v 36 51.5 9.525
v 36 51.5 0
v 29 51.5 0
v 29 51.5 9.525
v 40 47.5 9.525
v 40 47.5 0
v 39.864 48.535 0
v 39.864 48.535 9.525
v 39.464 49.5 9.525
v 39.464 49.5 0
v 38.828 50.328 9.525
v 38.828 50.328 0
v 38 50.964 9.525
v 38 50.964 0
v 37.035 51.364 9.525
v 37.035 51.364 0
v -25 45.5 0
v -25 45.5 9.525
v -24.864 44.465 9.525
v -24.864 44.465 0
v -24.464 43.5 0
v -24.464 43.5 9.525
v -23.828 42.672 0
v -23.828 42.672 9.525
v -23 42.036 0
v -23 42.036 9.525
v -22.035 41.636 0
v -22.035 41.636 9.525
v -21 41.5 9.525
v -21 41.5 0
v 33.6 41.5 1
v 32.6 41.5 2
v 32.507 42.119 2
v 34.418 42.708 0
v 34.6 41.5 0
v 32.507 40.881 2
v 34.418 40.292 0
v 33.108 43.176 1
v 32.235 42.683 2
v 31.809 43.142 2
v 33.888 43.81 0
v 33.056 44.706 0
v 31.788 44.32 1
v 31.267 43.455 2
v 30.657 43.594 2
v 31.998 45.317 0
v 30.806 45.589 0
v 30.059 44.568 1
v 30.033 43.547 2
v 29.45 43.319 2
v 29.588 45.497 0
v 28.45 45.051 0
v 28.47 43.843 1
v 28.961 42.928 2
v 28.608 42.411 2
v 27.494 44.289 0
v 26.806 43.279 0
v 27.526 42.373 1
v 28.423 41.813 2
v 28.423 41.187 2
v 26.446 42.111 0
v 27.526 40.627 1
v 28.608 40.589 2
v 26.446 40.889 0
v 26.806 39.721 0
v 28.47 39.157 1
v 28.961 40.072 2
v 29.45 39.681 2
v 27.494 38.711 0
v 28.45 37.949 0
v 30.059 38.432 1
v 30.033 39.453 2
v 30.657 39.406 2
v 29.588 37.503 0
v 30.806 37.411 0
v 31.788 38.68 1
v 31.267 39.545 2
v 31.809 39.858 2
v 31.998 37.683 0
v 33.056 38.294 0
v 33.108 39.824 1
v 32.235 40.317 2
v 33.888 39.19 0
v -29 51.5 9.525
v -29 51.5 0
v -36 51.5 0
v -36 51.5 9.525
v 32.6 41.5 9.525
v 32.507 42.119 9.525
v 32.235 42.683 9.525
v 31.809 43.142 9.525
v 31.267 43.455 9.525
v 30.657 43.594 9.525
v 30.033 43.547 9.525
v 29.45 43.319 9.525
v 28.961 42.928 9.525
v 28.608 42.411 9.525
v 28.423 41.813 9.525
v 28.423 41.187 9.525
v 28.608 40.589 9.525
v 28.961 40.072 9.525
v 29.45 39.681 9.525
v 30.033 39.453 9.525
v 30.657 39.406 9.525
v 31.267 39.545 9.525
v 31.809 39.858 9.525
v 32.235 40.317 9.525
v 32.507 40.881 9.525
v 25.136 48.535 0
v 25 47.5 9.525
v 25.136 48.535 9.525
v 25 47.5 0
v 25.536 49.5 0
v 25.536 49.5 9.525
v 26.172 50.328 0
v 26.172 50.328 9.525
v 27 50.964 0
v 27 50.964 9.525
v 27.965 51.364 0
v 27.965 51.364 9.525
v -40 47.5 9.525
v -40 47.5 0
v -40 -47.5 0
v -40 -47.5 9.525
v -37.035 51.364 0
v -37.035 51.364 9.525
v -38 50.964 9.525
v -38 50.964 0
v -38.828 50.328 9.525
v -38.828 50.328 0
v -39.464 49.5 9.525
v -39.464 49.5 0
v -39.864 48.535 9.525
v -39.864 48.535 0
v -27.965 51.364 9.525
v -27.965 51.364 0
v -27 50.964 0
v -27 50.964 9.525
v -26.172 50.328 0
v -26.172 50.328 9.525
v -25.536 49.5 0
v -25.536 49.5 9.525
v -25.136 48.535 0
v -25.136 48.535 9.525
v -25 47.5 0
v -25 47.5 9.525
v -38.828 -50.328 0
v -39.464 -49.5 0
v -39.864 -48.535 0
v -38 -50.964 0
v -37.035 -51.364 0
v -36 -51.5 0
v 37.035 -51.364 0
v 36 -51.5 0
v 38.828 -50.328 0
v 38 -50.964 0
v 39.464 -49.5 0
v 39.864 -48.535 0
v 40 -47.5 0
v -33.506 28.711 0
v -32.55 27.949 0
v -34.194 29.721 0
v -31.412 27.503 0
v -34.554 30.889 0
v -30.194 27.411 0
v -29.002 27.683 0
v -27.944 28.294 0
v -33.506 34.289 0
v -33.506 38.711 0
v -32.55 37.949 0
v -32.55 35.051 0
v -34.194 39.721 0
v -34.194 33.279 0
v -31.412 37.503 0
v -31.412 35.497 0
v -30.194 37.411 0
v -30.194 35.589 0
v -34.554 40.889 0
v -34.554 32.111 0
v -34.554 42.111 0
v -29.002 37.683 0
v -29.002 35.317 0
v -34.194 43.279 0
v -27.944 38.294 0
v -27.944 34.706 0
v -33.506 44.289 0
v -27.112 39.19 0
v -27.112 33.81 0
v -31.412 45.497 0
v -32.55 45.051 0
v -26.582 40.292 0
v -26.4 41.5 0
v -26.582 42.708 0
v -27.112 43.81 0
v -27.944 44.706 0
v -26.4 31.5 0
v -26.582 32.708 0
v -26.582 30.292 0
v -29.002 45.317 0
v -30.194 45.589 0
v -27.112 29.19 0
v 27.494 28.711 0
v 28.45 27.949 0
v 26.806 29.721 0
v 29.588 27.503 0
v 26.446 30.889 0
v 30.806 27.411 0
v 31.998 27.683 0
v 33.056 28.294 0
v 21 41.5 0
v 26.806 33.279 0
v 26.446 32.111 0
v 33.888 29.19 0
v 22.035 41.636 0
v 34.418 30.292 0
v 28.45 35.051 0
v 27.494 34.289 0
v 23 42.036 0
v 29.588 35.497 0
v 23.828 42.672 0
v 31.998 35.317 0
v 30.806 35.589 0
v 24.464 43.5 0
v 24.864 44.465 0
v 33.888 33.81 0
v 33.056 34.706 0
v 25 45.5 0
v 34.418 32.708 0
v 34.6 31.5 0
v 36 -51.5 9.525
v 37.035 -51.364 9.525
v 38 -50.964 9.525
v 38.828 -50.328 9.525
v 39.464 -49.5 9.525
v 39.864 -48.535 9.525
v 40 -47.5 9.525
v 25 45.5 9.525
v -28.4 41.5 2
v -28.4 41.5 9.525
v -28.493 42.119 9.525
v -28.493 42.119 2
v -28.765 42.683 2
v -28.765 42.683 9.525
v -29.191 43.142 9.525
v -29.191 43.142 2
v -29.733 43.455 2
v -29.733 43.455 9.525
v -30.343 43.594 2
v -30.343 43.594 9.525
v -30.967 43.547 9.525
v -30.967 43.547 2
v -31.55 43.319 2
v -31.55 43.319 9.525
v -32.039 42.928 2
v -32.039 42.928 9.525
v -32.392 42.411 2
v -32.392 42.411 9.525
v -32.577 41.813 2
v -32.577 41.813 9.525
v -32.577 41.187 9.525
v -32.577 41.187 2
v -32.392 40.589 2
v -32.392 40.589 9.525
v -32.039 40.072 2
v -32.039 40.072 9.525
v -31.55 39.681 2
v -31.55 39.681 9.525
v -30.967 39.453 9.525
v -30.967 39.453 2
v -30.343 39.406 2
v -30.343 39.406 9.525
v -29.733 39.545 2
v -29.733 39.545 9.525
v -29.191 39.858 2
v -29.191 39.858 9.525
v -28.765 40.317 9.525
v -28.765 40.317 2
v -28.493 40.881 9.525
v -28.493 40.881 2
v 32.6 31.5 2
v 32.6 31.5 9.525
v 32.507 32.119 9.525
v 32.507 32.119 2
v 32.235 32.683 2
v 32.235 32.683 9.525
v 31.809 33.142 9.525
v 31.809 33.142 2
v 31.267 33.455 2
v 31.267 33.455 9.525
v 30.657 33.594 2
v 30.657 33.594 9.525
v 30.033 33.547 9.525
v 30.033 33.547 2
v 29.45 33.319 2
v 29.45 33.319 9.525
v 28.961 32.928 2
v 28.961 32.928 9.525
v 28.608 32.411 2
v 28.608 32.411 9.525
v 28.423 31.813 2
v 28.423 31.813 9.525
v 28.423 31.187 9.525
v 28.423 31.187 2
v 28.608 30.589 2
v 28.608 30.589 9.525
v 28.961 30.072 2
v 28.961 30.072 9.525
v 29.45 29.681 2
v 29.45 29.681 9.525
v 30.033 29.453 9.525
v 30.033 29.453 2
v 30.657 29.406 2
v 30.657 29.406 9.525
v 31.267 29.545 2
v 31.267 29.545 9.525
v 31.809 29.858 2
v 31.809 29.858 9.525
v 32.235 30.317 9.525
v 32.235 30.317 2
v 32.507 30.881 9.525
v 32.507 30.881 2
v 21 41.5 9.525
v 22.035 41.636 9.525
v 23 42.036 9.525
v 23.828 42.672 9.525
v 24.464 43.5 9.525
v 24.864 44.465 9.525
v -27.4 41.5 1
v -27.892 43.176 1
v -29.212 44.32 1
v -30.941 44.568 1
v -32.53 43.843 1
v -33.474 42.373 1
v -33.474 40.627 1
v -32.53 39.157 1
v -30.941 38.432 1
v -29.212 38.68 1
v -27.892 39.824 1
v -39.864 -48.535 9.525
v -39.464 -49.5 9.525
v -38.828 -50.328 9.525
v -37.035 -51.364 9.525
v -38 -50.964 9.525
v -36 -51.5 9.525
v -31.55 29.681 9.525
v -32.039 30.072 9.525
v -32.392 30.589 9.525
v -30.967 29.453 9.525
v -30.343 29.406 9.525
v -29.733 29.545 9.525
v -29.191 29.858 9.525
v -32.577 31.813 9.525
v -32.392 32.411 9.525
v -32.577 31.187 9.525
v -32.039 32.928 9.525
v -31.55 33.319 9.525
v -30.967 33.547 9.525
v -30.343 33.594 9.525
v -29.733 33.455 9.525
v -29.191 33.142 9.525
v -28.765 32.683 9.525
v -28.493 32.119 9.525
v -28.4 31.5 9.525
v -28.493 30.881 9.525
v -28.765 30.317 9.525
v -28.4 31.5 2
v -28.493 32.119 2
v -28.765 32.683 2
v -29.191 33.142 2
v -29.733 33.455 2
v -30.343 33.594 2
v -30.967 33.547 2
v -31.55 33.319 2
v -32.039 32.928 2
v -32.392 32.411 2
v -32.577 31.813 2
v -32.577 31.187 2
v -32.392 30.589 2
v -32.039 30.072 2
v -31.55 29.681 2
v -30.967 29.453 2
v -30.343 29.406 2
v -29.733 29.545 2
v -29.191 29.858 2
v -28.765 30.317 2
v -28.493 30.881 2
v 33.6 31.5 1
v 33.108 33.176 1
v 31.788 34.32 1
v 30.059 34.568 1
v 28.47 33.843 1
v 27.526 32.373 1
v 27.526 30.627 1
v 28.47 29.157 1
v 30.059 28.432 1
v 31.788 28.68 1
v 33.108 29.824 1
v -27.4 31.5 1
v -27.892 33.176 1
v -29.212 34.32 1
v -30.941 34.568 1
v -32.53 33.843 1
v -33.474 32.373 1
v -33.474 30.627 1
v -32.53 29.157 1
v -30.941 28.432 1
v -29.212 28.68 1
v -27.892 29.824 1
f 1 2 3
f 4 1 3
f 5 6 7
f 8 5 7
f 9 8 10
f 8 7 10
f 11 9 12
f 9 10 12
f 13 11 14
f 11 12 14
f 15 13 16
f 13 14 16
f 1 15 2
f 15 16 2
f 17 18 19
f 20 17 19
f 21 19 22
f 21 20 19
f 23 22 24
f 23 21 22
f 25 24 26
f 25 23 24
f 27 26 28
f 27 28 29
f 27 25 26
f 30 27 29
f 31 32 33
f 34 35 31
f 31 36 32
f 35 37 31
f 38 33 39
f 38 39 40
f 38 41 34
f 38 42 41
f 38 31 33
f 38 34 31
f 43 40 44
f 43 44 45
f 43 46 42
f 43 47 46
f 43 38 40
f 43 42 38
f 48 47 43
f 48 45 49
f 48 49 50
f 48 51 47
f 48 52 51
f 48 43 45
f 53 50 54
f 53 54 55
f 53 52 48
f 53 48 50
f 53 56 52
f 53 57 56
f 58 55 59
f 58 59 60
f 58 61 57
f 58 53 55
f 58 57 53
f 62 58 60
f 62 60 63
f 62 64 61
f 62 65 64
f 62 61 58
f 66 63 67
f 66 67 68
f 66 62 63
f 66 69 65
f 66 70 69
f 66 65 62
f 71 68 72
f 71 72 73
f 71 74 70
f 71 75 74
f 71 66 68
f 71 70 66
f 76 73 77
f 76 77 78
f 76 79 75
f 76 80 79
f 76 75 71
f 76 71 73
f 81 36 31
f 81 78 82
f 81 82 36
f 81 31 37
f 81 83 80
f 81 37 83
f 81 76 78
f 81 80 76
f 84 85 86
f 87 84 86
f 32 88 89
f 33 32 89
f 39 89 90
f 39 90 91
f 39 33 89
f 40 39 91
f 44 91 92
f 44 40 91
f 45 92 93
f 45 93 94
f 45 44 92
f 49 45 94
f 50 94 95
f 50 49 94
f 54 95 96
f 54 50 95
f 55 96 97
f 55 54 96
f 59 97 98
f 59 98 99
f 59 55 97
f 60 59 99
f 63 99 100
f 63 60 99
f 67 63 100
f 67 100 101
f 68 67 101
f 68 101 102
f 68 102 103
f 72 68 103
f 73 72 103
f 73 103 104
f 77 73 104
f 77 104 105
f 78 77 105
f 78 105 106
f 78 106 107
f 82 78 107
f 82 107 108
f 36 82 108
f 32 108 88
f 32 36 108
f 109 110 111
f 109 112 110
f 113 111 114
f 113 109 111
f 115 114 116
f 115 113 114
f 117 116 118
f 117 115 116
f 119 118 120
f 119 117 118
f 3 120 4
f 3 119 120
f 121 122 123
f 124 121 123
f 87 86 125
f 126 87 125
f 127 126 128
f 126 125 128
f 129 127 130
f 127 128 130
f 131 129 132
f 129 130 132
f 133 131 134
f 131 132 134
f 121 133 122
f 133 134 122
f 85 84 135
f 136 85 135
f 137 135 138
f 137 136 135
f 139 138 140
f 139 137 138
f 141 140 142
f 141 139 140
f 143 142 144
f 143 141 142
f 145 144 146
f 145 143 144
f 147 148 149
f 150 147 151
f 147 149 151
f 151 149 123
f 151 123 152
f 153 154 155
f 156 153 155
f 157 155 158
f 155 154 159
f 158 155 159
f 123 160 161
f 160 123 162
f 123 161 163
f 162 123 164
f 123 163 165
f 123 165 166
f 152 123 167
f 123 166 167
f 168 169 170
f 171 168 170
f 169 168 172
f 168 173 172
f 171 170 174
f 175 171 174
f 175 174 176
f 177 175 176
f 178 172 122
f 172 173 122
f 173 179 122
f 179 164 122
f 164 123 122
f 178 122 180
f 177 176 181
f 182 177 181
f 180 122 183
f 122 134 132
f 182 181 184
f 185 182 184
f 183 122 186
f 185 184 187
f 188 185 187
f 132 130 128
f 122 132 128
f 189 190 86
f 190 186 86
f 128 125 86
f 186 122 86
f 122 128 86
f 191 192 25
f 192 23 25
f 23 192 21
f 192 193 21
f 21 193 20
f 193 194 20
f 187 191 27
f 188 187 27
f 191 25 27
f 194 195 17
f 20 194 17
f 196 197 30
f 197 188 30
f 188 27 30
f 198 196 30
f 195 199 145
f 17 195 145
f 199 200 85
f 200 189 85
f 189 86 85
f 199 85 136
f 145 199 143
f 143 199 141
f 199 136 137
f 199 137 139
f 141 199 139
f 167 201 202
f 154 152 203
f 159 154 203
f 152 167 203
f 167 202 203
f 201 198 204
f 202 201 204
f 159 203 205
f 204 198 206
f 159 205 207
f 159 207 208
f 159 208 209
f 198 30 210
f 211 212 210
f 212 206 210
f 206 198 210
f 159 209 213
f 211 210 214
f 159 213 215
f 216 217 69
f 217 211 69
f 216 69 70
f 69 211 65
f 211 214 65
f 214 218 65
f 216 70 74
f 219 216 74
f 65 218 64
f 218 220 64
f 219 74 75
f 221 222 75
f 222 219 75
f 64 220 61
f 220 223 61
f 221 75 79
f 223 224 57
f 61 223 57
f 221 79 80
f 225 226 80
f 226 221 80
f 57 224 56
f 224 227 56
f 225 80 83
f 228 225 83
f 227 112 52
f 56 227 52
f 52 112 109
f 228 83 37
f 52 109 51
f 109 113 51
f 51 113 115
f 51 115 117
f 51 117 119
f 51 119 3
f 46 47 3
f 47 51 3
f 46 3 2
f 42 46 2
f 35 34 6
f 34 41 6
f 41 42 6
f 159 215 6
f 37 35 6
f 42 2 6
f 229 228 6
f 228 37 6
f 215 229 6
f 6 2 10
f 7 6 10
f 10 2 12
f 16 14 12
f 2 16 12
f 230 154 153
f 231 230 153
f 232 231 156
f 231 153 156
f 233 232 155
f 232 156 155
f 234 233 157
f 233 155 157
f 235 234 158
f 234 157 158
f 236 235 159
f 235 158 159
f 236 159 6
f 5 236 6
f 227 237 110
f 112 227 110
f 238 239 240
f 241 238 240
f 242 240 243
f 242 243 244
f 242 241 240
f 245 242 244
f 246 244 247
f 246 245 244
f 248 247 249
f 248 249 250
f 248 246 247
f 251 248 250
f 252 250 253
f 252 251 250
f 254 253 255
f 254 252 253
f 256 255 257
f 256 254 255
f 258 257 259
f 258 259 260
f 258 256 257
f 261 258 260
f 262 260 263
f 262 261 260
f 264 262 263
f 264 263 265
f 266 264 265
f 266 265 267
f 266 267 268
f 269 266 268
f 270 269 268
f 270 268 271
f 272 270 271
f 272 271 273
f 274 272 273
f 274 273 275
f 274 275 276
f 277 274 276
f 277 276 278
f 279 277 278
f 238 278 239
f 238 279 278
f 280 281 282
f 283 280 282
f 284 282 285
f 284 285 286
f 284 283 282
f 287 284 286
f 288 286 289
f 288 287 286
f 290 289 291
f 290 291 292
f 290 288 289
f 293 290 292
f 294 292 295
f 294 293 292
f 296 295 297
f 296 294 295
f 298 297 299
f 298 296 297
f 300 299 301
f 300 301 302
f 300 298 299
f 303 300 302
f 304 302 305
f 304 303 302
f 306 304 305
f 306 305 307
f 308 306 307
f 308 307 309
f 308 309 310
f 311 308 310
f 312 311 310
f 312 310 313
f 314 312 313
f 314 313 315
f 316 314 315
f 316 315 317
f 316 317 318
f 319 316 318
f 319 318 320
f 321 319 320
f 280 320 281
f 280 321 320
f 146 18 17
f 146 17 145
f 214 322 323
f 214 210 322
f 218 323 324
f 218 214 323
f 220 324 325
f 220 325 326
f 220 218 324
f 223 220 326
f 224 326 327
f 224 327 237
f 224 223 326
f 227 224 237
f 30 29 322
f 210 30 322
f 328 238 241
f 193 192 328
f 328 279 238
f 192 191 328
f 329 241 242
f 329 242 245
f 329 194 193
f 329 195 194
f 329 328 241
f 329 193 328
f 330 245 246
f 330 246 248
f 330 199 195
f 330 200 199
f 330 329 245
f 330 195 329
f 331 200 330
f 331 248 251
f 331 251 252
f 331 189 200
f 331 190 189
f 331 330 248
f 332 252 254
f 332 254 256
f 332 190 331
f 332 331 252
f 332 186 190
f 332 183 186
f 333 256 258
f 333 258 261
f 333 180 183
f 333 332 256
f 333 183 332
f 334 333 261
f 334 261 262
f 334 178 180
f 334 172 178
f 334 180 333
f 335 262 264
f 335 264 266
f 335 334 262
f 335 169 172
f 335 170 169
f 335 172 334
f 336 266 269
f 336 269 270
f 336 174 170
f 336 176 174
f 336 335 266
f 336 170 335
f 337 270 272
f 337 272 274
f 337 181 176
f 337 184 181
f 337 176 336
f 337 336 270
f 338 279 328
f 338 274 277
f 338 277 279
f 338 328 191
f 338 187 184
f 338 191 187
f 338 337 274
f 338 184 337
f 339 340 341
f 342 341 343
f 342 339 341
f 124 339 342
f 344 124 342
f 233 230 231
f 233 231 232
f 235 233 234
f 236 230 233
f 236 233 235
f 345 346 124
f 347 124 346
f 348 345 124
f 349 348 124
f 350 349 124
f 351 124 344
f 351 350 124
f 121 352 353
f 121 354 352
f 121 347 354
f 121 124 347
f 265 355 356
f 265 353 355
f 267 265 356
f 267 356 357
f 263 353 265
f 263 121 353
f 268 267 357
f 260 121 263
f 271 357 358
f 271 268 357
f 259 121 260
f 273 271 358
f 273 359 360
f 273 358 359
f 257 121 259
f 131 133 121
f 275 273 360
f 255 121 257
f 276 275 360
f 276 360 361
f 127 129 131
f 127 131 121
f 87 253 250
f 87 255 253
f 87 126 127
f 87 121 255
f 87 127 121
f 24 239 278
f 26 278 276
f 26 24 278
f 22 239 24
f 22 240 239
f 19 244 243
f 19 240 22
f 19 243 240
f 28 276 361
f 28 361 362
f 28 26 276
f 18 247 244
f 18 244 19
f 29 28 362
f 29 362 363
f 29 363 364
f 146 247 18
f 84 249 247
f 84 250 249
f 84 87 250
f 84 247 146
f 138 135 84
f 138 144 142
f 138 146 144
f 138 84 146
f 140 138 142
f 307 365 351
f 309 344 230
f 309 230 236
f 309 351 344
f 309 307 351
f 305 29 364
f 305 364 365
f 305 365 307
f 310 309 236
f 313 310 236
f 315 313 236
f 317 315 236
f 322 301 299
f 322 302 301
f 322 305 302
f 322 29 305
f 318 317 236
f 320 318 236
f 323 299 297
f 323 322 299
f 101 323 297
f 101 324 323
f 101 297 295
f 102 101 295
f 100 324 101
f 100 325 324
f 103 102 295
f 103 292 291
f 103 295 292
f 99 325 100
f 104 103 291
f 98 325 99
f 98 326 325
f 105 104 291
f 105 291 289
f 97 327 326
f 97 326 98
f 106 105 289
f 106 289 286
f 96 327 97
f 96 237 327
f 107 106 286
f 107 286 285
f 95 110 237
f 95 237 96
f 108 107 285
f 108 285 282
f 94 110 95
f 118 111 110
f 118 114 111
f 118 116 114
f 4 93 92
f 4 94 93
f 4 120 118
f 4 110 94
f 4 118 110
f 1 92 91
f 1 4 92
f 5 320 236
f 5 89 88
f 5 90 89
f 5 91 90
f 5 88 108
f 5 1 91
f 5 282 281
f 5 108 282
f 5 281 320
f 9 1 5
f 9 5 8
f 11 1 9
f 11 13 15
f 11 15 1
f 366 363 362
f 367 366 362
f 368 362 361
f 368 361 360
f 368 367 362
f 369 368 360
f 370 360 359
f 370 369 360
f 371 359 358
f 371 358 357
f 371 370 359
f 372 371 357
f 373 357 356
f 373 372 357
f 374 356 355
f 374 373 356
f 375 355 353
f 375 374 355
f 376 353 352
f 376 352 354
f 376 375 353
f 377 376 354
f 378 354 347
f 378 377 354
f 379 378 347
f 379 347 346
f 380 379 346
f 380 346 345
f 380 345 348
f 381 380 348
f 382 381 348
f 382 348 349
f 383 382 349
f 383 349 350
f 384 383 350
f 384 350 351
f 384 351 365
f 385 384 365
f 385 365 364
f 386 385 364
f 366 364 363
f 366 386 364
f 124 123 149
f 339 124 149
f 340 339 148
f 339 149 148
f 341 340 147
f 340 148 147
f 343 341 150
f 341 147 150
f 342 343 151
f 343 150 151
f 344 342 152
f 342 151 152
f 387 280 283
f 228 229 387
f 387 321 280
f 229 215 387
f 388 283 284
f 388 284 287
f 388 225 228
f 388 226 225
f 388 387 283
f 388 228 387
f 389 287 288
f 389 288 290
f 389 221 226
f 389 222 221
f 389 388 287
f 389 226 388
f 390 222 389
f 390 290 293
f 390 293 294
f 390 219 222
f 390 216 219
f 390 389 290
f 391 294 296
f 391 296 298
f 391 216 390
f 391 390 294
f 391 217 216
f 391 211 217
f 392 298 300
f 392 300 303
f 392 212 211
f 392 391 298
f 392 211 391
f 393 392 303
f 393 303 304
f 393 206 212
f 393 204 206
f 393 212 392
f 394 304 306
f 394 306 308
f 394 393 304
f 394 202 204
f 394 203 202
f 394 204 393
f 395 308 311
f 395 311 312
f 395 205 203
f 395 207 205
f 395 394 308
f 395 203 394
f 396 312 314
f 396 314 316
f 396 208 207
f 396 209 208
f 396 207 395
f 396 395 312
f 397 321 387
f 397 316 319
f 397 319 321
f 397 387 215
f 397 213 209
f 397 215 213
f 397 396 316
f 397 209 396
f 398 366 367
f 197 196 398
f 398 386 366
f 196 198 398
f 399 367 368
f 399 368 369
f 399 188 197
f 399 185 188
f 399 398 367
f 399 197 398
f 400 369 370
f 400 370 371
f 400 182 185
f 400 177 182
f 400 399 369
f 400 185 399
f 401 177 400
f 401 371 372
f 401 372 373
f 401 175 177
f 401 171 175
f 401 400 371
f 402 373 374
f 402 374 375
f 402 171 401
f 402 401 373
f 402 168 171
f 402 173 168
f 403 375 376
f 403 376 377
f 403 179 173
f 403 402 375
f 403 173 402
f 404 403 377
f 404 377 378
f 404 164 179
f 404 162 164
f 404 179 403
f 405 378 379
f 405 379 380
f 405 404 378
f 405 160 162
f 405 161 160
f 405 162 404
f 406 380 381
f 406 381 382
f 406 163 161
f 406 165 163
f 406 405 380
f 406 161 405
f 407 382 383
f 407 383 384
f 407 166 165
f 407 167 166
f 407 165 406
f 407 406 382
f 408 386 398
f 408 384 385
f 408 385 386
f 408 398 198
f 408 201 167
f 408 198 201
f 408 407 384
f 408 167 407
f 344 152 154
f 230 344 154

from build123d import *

# Parameters (mm, degrees)
F0_R     = 2.1
F1_DEPTH = 9.525
F2_SIZE2 = 2
F2_SIZE  = 2
F3_W     = 50
F3_H     = 10
F4_DEPTH = 25
F5_R     = 4
F6_R     = 4


with BuildPart() as f1:
    # F0 (on Top) → F1 (new body)
    with BuildSketch(Plane.XY):
        with BuildLine():
            ThreePointArc((40, 47.5), (38.8284271247, 50.3284271247), (36, 51.5))
            Line((36, 51.5), (-36, 51.5))
            ThreePointArc((-36, 51.5), (-38.8284271247, 50.3284271247), (-40, 47.5))
            Line((-40, 47.5), (-40, -47.5))
            ThreePointArc((-40, -47.5), (-38.8284271247, -50.3284271247), (-36, -51.5))
            Line((-36, -51.5), (36, -51.5))
            ThreePointArc((36, -51.5), (38.8284271247, -50.3284271247), (40, -47.5))
            Line((40, -47.5), (40, 47.5))
        make_face()
        with Locations((-30.5, 31.5)):
            Circle(F0_R, mode=Mode.SUBTRACT)
        with Locations((-30.5, 41.5)):
            Circle(F0_R, mode=Mode.SUBTRACT)
        with Locations((30.5, 31.5)):
            Circle(F0_R, mode=Mode.SUBTRACT)
        with Locations((30.5, 41.5)):
            Circle(F0_R, mode=Mode.SUBTRACT)
    extrude(amount=F1_DEPTH)

    # F2
    f2_edges = [f1.edges().sort_by_distance(p)[0] for p in [
        (28.4, 41.5, 0),
        (28.4, 31.5, 0),
        (-32.6, 31.5, 0),
        (-32.6, 41.5, 0),
    ]]
    chamfer(f2_edges, length=F2_SIZE, length2=F2_SIZE2)

    # F3 (on face) → F4 (cut)
    with BuildSketch(Plane.XY.offset(9.525)):
        with Locations((0, 46.5)):
            Rectangle(F3_W, F3_H)
    extrude(amount=-F4_DEPTH, mode=Mode.SUBTRACT)

    # F5
    f5_edges = [f1.edges().sort_by_distance(p)[0] for p in [
        (-25, 51.5, 4.7625),
        (25, 51.5, 4.7625),
    ]]
    fillet(f5_edges, radius=F5_R)

    # F6
    f6_edges = [f1.edges().sort_by_distance(p)[0] for p in [
        (25, 41.5, 4.7625),
        (-25, 41.5, 4.7625),
    ]]
    fillet(f6_edges, radius=F6_R)


solid = f1.part
